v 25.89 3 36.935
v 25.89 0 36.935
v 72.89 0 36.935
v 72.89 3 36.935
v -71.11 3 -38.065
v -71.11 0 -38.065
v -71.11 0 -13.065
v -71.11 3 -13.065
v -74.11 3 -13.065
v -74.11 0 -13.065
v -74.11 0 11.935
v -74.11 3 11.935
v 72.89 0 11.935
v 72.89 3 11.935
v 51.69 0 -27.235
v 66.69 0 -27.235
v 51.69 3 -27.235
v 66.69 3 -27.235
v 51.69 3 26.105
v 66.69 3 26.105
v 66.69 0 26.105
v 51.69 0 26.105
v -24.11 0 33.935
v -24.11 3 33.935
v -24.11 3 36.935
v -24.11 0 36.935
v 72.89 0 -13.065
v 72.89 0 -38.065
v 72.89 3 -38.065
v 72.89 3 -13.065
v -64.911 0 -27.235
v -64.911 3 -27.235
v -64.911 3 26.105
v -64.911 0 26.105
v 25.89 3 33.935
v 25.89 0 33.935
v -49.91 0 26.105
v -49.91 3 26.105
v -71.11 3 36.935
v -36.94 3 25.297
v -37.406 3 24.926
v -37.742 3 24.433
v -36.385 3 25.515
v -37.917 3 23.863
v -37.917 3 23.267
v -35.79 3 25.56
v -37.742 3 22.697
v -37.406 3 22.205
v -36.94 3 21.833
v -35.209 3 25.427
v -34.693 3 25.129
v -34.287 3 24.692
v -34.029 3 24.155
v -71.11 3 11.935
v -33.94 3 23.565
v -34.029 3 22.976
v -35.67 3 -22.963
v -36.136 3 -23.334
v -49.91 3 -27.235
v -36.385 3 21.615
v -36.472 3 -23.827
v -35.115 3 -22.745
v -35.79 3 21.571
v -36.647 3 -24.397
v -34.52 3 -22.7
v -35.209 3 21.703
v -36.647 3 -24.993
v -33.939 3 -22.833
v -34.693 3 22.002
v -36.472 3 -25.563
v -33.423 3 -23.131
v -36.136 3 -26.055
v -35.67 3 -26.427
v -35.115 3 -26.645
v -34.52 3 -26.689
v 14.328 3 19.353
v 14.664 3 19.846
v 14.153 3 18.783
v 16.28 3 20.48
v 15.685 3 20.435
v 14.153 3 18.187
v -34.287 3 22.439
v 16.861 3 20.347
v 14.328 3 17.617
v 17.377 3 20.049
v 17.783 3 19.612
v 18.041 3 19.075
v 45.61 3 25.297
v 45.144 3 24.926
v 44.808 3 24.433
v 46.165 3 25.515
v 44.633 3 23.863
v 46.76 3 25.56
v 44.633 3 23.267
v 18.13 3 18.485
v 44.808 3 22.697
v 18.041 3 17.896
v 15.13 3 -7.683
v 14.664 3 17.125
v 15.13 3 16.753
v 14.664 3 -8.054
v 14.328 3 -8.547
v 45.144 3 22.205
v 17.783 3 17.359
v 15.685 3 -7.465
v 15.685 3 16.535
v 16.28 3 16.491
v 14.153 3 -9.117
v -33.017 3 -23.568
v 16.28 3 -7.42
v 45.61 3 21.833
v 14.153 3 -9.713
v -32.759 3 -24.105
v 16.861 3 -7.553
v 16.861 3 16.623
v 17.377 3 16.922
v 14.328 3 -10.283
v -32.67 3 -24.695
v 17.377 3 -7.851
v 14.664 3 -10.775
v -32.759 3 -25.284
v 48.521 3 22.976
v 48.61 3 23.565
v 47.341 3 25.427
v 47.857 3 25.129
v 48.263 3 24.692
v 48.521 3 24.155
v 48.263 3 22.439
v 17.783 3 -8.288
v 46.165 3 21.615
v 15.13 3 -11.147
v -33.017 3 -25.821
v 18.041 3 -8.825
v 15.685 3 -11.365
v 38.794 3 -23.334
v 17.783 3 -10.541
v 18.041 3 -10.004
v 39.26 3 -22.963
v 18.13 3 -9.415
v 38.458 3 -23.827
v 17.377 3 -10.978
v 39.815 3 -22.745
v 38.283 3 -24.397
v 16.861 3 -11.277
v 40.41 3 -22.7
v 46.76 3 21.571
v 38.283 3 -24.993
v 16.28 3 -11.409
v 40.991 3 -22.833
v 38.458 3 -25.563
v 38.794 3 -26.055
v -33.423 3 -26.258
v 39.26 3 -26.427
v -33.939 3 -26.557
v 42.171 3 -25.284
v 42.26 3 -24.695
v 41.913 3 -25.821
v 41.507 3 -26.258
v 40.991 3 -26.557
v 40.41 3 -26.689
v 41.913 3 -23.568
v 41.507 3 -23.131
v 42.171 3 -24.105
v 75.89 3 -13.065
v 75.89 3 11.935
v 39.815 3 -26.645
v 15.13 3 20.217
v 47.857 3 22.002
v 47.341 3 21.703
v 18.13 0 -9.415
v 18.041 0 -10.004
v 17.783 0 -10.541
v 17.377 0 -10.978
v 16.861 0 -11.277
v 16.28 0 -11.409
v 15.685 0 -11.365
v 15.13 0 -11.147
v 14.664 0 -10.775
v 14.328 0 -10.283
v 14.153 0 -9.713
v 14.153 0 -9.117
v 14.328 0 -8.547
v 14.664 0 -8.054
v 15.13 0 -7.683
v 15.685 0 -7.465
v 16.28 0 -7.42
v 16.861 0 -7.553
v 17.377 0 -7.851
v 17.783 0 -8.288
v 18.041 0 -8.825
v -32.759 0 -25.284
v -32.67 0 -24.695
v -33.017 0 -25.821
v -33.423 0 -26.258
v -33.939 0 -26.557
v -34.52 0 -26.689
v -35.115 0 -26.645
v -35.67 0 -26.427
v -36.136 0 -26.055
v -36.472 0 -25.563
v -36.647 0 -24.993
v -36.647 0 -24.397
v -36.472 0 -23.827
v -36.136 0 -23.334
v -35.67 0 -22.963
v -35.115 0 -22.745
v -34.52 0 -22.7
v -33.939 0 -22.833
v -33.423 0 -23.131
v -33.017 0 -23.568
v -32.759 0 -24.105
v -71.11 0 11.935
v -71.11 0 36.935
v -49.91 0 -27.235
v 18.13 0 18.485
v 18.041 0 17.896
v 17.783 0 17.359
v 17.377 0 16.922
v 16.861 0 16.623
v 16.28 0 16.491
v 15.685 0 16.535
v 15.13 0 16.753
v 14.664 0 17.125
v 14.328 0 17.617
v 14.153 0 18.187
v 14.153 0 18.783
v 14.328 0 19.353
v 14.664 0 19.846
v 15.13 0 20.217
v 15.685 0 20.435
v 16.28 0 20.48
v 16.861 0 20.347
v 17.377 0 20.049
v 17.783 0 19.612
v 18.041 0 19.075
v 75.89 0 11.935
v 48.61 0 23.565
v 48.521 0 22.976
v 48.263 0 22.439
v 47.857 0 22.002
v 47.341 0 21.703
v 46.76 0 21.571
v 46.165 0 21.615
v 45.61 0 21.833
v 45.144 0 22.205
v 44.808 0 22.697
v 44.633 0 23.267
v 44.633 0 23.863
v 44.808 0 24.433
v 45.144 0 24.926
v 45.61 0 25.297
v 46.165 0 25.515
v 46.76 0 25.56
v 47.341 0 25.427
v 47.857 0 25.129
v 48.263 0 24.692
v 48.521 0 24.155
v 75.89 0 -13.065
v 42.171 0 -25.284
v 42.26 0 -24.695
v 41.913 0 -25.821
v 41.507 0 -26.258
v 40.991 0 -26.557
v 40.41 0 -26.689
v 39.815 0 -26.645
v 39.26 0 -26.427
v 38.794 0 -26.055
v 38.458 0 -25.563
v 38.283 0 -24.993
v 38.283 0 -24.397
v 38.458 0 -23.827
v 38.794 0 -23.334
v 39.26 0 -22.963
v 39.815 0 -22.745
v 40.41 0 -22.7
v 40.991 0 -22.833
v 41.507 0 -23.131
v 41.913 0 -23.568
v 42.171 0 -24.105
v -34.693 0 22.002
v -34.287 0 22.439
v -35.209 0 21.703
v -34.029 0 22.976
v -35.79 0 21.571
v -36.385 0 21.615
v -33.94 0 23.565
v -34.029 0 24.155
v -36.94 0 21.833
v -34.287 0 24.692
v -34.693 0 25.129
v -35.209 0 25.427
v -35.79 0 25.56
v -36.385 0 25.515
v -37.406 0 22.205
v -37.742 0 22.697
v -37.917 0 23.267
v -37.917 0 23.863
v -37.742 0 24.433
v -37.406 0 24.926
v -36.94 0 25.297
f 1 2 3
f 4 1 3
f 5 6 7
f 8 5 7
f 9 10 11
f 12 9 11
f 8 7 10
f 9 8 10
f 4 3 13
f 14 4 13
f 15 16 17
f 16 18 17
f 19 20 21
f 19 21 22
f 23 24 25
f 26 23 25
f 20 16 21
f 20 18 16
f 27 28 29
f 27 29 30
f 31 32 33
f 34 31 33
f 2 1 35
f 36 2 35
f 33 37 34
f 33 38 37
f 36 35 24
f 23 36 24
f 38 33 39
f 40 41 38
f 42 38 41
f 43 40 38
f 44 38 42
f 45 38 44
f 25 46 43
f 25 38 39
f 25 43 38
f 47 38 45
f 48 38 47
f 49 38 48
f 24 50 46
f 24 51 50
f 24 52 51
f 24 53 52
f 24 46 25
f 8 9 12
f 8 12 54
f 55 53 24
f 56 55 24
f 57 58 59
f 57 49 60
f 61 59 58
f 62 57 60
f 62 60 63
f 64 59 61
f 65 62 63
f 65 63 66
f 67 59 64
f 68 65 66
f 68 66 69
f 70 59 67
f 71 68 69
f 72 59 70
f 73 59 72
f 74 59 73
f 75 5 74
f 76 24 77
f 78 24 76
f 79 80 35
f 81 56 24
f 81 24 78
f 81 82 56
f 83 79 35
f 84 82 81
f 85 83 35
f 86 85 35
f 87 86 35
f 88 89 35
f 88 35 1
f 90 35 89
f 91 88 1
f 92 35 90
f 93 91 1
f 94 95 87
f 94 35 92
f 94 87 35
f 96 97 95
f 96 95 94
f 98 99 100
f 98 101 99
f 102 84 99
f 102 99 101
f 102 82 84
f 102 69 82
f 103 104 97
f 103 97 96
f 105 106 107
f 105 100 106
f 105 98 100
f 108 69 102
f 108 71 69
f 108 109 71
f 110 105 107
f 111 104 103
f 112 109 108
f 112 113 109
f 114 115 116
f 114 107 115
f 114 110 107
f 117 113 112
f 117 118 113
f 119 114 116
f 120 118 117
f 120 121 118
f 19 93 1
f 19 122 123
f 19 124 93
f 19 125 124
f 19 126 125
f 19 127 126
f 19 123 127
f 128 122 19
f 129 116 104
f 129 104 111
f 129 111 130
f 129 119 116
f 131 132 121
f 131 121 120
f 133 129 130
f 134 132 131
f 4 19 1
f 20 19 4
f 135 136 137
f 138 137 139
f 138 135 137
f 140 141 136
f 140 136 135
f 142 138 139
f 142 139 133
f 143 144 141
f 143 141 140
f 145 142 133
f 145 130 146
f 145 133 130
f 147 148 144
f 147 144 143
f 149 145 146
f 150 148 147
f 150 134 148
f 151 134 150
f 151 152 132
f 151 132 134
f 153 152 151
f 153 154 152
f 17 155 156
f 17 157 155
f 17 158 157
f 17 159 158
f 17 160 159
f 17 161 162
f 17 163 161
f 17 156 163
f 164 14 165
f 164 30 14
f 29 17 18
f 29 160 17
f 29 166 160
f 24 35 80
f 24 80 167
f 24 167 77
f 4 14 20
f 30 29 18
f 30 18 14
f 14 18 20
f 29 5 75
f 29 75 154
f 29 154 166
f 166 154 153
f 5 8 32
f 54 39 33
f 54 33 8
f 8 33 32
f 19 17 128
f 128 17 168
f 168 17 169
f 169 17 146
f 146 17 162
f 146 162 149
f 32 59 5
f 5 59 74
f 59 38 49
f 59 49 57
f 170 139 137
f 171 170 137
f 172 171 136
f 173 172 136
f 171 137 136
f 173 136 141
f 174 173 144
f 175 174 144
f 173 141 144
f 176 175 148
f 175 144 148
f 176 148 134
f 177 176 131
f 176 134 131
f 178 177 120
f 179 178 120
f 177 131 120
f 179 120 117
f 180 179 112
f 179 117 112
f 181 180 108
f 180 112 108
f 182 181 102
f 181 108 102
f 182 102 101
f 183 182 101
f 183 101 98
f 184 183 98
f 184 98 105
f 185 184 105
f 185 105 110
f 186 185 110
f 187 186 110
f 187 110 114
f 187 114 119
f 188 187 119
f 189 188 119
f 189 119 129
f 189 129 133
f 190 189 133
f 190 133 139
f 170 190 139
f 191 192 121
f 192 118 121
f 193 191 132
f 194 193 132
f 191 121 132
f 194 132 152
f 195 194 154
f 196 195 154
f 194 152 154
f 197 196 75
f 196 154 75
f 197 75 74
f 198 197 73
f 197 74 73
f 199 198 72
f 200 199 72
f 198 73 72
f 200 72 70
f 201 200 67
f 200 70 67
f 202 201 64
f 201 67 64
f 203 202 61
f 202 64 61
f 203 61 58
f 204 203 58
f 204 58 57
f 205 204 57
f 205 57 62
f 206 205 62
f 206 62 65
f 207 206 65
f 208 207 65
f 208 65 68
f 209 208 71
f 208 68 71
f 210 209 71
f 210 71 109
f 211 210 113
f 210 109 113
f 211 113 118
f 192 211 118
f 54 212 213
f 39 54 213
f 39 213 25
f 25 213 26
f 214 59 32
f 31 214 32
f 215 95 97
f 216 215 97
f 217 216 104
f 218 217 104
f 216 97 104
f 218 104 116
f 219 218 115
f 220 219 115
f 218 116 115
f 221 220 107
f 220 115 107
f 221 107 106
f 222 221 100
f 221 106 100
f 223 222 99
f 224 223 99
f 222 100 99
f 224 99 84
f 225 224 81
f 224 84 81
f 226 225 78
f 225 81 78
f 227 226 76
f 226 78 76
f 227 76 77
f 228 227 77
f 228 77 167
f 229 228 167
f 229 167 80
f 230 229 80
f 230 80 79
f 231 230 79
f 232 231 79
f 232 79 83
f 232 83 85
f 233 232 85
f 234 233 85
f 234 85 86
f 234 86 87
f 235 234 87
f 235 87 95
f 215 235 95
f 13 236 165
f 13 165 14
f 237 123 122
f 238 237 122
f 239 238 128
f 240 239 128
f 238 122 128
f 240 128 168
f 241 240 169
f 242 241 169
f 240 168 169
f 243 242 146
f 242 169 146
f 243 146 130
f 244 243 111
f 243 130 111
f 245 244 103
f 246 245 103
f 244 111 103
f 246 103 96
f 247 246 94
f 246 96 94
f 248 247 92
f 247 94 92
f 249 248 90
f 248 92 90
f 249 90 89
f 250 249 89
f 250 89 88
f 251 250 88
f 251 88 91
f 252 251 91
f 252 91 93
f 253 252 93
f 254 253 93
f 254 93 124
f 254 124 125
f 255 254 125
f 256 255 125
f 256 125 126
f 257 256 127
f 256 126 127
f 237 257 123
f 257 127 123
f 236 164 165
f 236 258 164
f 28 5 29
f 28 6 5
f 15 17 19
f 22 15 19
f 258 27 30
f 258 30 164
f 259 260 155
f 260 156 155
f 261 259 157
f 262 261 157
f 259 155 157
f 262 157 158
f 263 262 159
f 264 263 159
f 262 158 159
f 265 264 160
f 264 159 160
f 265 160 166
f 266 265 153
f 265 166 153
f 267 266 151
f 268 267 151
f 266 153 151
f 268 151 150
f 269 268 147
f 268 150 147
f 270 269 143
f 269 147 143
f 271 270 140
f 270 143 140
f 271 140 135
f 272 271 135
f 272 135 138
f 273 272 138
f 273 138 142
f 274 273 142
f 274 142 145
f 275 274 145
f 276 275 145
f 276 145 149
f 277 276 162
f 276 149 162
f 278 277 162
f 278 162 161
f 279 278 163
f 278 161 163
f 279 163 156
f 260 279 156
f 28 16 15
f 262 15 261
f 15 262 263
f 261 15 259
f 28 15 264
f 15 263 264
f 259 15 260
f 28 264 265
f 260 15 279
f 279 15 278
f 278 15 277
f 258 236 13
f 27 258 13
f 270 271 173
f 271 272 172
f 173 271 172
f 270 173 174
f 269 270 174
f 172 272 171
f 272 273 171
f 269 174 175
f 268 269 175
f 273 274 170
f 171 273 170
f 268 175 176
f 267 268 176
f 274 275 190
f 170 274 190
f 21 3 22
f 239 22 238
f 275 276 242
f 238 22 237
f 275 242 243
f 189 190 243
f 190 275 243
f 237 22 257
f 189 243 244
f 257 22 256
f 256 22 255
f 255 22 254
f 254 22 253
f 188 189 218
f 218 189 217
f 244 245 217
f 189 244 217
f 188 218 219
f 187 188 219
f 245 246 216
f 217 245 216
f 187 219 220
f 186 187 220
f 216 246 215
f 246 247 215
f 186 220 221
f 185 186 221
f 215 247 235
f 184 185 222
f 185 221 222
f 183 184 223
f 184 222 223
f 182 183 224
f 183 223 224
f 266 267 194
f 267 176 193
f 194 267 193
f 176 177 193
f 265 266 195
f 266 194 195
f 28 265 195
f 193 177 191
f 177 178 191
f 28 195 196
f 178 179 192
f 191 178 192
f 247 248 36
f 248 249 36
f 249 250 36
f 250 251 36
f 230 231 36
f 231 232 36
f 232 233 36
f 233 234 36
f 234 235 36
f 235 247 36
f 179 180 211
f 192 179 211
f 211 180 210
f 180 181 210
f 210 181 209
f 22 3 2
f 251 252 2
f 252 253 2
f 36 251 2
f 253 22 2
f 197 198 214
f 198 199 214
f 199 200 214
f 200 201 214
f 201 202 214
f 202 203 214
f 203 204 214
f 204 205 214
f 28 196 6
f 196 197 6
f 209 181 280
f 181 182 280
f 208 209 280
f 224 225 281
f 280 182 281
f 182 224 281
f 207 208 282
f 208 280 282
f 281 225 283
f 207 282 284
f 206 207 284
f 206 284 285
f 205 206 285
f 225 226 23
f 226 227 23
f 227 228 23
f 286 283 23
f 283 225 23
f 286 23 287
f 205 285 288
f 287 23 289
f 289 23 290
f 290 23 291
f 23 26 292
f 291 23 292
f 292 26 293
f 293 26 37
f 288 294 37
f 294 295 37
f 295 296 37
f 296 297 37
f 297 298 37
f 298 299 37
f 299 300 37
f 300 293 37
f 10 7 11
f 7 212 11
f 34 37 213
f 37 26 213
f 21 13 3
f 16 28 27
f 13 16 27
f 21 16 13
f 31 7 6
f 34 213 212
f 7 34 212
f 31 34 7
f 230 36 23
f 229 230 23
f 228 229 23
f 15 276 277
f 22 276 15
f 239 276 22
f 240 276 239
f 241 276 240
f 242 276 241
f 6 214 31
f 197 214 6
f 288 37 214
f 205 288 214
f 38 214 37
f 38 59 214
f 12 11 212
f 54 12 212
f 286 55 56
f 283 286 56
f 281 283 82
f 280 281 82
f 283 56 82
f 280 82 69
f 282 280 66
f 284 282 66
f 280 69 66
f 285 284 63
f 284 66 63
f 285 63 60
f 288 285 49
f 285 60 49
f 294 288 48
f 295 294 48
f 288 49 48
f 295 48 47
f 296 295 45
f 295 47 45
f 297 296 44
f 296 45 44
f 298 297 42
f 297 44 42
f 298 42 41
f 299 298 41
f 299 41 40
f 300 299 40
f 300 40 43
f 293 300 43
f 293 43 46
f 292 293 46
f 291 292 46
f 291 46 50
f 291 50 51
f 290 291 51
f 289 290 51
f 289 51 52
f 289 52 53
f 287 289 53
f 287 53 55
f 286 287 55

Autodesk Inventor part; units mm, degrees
ref_plane "YZ Plane" through (0, 0, 0) normal (1, 0, 0) x (0, 1, 0)
ref_plane "XZ Plane" through (0, 0, 0) normal (0, 1, 0) x (-1, 0, 0)
ref_plane "XY Plane" through (0, 0, 0) normal (0, 0, 1) x (1, 0, 0)
sketch "Sketch1" plane through (0, 0, 0) normal (0, 1, 0) x (-1, 0, 0)
  line L0 (71.1097, -38.0648) -> (71.1097, -13.0648)
  line L1 (71.1097, -13.0648) -> (74.1097, -13.0648)
  line L2 (74.1097, -13.0648) -> (74.1097, 11.9352)
  line L3 (74.1097, 11.9352) -> (71.1097, 11.9352)
  line L4 (71.1097, 11.9352) -> (71.1097, 36.9352)
  line L5 (-72.8903, -38.0648) -> (-72.8903, -13.0648)
  line L6 (-72.8903, 36.9352) -> (-72.8903, 11.9352)
  line L7 (-72.8903, -13.0648) -> (-75.8903, -13.0648)
  line L8 (-75.8903, -13.0648) -> (-75.8903, 11.9352)
  line L9 (-75.8903, 11.9352) -> (-72.8903, 11.9352)
  line L10 (71.1097, -38.0648) -> (-72.8903, -38.0648)
  line L11 (71.1097, 36.9352) -> (-72.8903, 36.9352)
  point P0 (0, 0)
extrude "Extrusion1" add sketch "Sketch1" along normal blind 3
sketch "Sketch2" plane through (0, 3, 0) normal (0, 1, 0) x (1, 0, 0)
  line L0 (-74.1097, 13.0648) -> (-74.1097, -11.9352) projected
  line L1 (75.8903, -11.9352) -> (75.8903, 13.0648) projected
  line L2 (-71.1097, -36.9352) -> (72.8903, -36.9352) projected
  line L3 (-24.1097, -36.9352) -> (25.8903, -36.9352)
  line L4 (25.8903, -36.9352) -> (25.8903, -33.9352)
  line L5 (25.8903, -33.9352) -> (-24.1097, -33.9352)
  line L6 (-24.1097, -33.9352) -> (-24.1097, -36.9352)
  line L7 (72.8903, 38.0648) -> (-71.1097, 38.0648) projected
  point P0 (0, 0)
  dimension "d13" = 50
  dimension "d14" = 3
extrude "Extrusion2" cut sketch "Sketch2" against normal blind 30
sketch "Sketch3" plane through (0, 3, 0) normal (0, 1, 0) x (1, 0, 0)
  line L0 (-71.1097, -36.9352) -> (-24.1097, -36.9352) projected
  line L1 (-74.1097, 13.0648) -> (-74.1097, -11.9352) projected
  line L2 (-54.9097, 25.4648) -> (-64.9114, 25.4648)
  line L3 (-64.9114, 25.4648) -> (-64.9114, -24.8352)
  line L4 (-64.9114, -24.8352) -> (-54.9097, -24.8352)
  line L5 (-54.9097, -24.8352) -> (-54.9097, 25.4648)
  line L6 (56.6903, 25.4648) -> (66.6903, 25.4648)
  line L7 (66.6903, 25.4648) -> (66.6903, -24.8352)
  line L8 (66.6903, -24.8352) -> (56.6903, -24.8352)
  line L9 (56.6903, -24.8352) -> (56.6903, 25.4648)
  circle A0 centre (-34.6697, 22.9248) radius 2
  circle A1 centre (-35.9397, -22.2952) radius 2
  circle A2 centre (40.2603, 22.9248) radius 2
  circle A3 centre (46.6103, -22.2952) radius 2
  line L10 (-49.9097, 28.4648) -> (51.6903, 28.4648)
  line L11 (51.6903, 28.4648) -> (51.6903, 33.4648)
  line L12 (51.6903, 33.4648) -> (-49.9097, 33.4648)
  line L13 (-49.9097, 33.4648) -> (-49.9097, 28.4648)
  point P0 (0, 0)
  dimension "d32" = 4
  dimension "d35" = 4
  dimension "d38" = 4
  dimension "d39" = 4
extrude "Extrusion3" cut sketch "Sketch3" against normal blind 10
sketch "Sketch4" plane through (-49.9097, 3, -33.4648) normal (0, 0, 1) x (1, 0, 0)
  line L0 (0, 0) -> (101.6, 0) projected
  line L1 (0, 0) -> (101.6, 0)
  line L2 (101.6, 0) -> (101.6, -3)
  line L3 (101.6, -3) -> (0, -3)
  line L4 (0, -3) -> (0, 0)
  point P0 (49.9097, -3)
extrude "Extrusion4" add sketch "Sketch4" along normal blind 5.2375
sketch "Sketch5" plane through (0, 3, 0) normal (0, 1, 0) x (1, 0, 0)
  circle A0 centre (-34.6697, 22.9248) radius 2 projected
  circle A1 centre (-34.6697, 22.9248) radius 2
  circle A2 centre (40.2603, 22.9248) radius 2 projected
  circle A3 centre (40.2603, 22.9248) radius 2
  circle A4 centre (46.6103, -22.2952) radius 2 projected
  circle A5 centre (46.6103, -22.2952) radius 2
  circle A6 centre (-35.9397, -22.2952) radius 2 projected
  circle A7 centre (-35.9397, -22.2952) radius 2
  point P0 (0, 0)
extrude "Extrusion5" add sketch "Sketch5" against normal blind 3
sketch "Sketch6" plane through (0, 3, 0) normal (0, 1, 0) x (1, 0, 0)
  point P0 (0, 0)
sketch "Sketch7" plane through (0, 3, 0) normal (0, 1, 0) x (1, 0, 0)
  line L0 (-54.9097, -24.8352) -> (-54.9097, 25.4648) projected
  line L1 (56.6903, 25.4648) -> (56.6903, -24.8352) projected
  line L2 (72.8903, 38.0648) -> (-71.1097, 38.0648) projected
  line L3 (25.8903, -36.9352) -> (72.8903, -36.9352) projected
  line L4 (-74.1097, 13.0648) -> (-74.1097, -11.9352) projected
  line L5 (75.8903, -11.9352) -> (75.8903, 13.0648) projected
  line L6 (-64.9114, 25.4648) -> (-64.9114, -24.8352) projected
  line L7 (-64.9114, 25.4648) -> (-54.9097, 25.4648)
  line L8 (-54.9097, 25.4648) -> (-54.9097, 27.2348)
  line L9 (-54.9097, 27.2348) -> (-64.9114, 27.2348)
  line L10 (-64.9114, 27.2348) -> (-64.9114, 25.4648)
  line L11 (-64.9114, -24.8352) -> (-54.9097, -24.8352)
  line L12 (-54.9097, -24.8352) -> (-54.9097, -26.1052)
  line L13 (-54.9097, -26.1052) -> (-64.9114, -26.1052)
  line L14 (-64.9114, -26.1052) -> (-64.9114, -24.8352)
  line L15 (56.6903, -24.8352) -> (66.6903, -24.8352) projected
  line L16 (56.6903, -24.8352) -> (66.6903, -24.8352)
  line L17 (66.6903, -24.8352) -> (66.6903, -26.1052)
  line L18 (66.6903, -26.1052) -> (56.6903, -26.1052)
  line L19 (56.6903, -26.1052) -> (56.6903, -24.8352)
  line L20 (66.6903, 25.4648) -> (56.6903, 25.4648) projected
  line L21 (56.6903, 25.4648) -> (66.6903, 25.4648)
  line L22 (66.6903, 25.4648) -> (66.6903, 27.2348)
  line L23 (66.6903, 27.2348) -> (56.6903, 27.2348)
  line L24 (56.6903, 27.2348) -> (56.6903, 25.4648)
  circle A0 centre (-35.9397, -23.5652) radius 2
  circle A1 centre (46.6103, -23.5652) radius 2
  circle A2 centre (-34.6697, 24.6948) radius 2
  circle A3 centre (40.2603, 24.6948) radius 2
  circle A4 centre (16.1303, -18.4852) radius 2
  circle A5 centre (16.1303, 9.4148) radius 2
  point P0 (0, 0)
  dimension "d61" = 4
  dimension "d63" = 4
  dimension "d69" = 4
  dimension "d71" = 4
  dimension "d74" = 4
  dimension "d76" = 4
extrude "Extrusion6" cut sketch "Sketch7" against normal blind 3 contours L12 L13 L14 L11 | L7 L10 L9 L8 | L15 L17 L18 L19 | L24 L23 L22 L20 | A0 | A1 | A2 | A3 | A4 | A5
sketch "Sketch8" plane through (0, 3, 0) normal (0, 1, 0) x (1, 0, 0)
  point P0 (0, 0)
sketch "Sketch9" plane through (0, 3, 0) normal (0, 1, 0) x (1, 0, 0)
  circle A0 centre (46.6103, -23.5652) radius 2 projected
  circle A1 centre (-35.9397, -23.5652) radius 2 projected
  circle A2 centre (40.2603, 24.6948) radius 2 projected
  point P0 (0, 0)
sketch "Sketch10" plane through (0, 3, 0) normal (0, 1, 0) x (1, 0, 0)
  line L0 (56.6903, 27.2348) -> (66.6903, 27.2348) projected
  line L1 (56.6903, 27.2348) -> (51.6903, 27.2348)
  line L2 (51.6903, 27.2348) -> (51.6903, -26.1052)
  line L3 (51.6903, -26.1052) -> (56.6903, -26.1052)
  line L4 (56.6903, -26.1052) -> (56.6903, 27.2348)
  line L5 (-54.9097, -26.1052) -> (-54.9097, 27.2348) projected
  line L6 (-54.9097, 27.2348) -> (-49.9097, 27.2348)
  line L7 (-49.9097, 27.2348) -> (-49.9097, -26.1052)
  line L8 (-49.9097, -26.1052) -> (-54.9097, -26.1052)
  line L9 (-54.9097, -26.1052) -> (-54.9097, 27.2348)
  point P0 (0, 0)
  dimension "d79" = 5
  dimension "d80" = 5
extrude "Extrusion7" cut sketch "Sketch10" against normal blind 10
properties part number "Level2 (Arduino)"
